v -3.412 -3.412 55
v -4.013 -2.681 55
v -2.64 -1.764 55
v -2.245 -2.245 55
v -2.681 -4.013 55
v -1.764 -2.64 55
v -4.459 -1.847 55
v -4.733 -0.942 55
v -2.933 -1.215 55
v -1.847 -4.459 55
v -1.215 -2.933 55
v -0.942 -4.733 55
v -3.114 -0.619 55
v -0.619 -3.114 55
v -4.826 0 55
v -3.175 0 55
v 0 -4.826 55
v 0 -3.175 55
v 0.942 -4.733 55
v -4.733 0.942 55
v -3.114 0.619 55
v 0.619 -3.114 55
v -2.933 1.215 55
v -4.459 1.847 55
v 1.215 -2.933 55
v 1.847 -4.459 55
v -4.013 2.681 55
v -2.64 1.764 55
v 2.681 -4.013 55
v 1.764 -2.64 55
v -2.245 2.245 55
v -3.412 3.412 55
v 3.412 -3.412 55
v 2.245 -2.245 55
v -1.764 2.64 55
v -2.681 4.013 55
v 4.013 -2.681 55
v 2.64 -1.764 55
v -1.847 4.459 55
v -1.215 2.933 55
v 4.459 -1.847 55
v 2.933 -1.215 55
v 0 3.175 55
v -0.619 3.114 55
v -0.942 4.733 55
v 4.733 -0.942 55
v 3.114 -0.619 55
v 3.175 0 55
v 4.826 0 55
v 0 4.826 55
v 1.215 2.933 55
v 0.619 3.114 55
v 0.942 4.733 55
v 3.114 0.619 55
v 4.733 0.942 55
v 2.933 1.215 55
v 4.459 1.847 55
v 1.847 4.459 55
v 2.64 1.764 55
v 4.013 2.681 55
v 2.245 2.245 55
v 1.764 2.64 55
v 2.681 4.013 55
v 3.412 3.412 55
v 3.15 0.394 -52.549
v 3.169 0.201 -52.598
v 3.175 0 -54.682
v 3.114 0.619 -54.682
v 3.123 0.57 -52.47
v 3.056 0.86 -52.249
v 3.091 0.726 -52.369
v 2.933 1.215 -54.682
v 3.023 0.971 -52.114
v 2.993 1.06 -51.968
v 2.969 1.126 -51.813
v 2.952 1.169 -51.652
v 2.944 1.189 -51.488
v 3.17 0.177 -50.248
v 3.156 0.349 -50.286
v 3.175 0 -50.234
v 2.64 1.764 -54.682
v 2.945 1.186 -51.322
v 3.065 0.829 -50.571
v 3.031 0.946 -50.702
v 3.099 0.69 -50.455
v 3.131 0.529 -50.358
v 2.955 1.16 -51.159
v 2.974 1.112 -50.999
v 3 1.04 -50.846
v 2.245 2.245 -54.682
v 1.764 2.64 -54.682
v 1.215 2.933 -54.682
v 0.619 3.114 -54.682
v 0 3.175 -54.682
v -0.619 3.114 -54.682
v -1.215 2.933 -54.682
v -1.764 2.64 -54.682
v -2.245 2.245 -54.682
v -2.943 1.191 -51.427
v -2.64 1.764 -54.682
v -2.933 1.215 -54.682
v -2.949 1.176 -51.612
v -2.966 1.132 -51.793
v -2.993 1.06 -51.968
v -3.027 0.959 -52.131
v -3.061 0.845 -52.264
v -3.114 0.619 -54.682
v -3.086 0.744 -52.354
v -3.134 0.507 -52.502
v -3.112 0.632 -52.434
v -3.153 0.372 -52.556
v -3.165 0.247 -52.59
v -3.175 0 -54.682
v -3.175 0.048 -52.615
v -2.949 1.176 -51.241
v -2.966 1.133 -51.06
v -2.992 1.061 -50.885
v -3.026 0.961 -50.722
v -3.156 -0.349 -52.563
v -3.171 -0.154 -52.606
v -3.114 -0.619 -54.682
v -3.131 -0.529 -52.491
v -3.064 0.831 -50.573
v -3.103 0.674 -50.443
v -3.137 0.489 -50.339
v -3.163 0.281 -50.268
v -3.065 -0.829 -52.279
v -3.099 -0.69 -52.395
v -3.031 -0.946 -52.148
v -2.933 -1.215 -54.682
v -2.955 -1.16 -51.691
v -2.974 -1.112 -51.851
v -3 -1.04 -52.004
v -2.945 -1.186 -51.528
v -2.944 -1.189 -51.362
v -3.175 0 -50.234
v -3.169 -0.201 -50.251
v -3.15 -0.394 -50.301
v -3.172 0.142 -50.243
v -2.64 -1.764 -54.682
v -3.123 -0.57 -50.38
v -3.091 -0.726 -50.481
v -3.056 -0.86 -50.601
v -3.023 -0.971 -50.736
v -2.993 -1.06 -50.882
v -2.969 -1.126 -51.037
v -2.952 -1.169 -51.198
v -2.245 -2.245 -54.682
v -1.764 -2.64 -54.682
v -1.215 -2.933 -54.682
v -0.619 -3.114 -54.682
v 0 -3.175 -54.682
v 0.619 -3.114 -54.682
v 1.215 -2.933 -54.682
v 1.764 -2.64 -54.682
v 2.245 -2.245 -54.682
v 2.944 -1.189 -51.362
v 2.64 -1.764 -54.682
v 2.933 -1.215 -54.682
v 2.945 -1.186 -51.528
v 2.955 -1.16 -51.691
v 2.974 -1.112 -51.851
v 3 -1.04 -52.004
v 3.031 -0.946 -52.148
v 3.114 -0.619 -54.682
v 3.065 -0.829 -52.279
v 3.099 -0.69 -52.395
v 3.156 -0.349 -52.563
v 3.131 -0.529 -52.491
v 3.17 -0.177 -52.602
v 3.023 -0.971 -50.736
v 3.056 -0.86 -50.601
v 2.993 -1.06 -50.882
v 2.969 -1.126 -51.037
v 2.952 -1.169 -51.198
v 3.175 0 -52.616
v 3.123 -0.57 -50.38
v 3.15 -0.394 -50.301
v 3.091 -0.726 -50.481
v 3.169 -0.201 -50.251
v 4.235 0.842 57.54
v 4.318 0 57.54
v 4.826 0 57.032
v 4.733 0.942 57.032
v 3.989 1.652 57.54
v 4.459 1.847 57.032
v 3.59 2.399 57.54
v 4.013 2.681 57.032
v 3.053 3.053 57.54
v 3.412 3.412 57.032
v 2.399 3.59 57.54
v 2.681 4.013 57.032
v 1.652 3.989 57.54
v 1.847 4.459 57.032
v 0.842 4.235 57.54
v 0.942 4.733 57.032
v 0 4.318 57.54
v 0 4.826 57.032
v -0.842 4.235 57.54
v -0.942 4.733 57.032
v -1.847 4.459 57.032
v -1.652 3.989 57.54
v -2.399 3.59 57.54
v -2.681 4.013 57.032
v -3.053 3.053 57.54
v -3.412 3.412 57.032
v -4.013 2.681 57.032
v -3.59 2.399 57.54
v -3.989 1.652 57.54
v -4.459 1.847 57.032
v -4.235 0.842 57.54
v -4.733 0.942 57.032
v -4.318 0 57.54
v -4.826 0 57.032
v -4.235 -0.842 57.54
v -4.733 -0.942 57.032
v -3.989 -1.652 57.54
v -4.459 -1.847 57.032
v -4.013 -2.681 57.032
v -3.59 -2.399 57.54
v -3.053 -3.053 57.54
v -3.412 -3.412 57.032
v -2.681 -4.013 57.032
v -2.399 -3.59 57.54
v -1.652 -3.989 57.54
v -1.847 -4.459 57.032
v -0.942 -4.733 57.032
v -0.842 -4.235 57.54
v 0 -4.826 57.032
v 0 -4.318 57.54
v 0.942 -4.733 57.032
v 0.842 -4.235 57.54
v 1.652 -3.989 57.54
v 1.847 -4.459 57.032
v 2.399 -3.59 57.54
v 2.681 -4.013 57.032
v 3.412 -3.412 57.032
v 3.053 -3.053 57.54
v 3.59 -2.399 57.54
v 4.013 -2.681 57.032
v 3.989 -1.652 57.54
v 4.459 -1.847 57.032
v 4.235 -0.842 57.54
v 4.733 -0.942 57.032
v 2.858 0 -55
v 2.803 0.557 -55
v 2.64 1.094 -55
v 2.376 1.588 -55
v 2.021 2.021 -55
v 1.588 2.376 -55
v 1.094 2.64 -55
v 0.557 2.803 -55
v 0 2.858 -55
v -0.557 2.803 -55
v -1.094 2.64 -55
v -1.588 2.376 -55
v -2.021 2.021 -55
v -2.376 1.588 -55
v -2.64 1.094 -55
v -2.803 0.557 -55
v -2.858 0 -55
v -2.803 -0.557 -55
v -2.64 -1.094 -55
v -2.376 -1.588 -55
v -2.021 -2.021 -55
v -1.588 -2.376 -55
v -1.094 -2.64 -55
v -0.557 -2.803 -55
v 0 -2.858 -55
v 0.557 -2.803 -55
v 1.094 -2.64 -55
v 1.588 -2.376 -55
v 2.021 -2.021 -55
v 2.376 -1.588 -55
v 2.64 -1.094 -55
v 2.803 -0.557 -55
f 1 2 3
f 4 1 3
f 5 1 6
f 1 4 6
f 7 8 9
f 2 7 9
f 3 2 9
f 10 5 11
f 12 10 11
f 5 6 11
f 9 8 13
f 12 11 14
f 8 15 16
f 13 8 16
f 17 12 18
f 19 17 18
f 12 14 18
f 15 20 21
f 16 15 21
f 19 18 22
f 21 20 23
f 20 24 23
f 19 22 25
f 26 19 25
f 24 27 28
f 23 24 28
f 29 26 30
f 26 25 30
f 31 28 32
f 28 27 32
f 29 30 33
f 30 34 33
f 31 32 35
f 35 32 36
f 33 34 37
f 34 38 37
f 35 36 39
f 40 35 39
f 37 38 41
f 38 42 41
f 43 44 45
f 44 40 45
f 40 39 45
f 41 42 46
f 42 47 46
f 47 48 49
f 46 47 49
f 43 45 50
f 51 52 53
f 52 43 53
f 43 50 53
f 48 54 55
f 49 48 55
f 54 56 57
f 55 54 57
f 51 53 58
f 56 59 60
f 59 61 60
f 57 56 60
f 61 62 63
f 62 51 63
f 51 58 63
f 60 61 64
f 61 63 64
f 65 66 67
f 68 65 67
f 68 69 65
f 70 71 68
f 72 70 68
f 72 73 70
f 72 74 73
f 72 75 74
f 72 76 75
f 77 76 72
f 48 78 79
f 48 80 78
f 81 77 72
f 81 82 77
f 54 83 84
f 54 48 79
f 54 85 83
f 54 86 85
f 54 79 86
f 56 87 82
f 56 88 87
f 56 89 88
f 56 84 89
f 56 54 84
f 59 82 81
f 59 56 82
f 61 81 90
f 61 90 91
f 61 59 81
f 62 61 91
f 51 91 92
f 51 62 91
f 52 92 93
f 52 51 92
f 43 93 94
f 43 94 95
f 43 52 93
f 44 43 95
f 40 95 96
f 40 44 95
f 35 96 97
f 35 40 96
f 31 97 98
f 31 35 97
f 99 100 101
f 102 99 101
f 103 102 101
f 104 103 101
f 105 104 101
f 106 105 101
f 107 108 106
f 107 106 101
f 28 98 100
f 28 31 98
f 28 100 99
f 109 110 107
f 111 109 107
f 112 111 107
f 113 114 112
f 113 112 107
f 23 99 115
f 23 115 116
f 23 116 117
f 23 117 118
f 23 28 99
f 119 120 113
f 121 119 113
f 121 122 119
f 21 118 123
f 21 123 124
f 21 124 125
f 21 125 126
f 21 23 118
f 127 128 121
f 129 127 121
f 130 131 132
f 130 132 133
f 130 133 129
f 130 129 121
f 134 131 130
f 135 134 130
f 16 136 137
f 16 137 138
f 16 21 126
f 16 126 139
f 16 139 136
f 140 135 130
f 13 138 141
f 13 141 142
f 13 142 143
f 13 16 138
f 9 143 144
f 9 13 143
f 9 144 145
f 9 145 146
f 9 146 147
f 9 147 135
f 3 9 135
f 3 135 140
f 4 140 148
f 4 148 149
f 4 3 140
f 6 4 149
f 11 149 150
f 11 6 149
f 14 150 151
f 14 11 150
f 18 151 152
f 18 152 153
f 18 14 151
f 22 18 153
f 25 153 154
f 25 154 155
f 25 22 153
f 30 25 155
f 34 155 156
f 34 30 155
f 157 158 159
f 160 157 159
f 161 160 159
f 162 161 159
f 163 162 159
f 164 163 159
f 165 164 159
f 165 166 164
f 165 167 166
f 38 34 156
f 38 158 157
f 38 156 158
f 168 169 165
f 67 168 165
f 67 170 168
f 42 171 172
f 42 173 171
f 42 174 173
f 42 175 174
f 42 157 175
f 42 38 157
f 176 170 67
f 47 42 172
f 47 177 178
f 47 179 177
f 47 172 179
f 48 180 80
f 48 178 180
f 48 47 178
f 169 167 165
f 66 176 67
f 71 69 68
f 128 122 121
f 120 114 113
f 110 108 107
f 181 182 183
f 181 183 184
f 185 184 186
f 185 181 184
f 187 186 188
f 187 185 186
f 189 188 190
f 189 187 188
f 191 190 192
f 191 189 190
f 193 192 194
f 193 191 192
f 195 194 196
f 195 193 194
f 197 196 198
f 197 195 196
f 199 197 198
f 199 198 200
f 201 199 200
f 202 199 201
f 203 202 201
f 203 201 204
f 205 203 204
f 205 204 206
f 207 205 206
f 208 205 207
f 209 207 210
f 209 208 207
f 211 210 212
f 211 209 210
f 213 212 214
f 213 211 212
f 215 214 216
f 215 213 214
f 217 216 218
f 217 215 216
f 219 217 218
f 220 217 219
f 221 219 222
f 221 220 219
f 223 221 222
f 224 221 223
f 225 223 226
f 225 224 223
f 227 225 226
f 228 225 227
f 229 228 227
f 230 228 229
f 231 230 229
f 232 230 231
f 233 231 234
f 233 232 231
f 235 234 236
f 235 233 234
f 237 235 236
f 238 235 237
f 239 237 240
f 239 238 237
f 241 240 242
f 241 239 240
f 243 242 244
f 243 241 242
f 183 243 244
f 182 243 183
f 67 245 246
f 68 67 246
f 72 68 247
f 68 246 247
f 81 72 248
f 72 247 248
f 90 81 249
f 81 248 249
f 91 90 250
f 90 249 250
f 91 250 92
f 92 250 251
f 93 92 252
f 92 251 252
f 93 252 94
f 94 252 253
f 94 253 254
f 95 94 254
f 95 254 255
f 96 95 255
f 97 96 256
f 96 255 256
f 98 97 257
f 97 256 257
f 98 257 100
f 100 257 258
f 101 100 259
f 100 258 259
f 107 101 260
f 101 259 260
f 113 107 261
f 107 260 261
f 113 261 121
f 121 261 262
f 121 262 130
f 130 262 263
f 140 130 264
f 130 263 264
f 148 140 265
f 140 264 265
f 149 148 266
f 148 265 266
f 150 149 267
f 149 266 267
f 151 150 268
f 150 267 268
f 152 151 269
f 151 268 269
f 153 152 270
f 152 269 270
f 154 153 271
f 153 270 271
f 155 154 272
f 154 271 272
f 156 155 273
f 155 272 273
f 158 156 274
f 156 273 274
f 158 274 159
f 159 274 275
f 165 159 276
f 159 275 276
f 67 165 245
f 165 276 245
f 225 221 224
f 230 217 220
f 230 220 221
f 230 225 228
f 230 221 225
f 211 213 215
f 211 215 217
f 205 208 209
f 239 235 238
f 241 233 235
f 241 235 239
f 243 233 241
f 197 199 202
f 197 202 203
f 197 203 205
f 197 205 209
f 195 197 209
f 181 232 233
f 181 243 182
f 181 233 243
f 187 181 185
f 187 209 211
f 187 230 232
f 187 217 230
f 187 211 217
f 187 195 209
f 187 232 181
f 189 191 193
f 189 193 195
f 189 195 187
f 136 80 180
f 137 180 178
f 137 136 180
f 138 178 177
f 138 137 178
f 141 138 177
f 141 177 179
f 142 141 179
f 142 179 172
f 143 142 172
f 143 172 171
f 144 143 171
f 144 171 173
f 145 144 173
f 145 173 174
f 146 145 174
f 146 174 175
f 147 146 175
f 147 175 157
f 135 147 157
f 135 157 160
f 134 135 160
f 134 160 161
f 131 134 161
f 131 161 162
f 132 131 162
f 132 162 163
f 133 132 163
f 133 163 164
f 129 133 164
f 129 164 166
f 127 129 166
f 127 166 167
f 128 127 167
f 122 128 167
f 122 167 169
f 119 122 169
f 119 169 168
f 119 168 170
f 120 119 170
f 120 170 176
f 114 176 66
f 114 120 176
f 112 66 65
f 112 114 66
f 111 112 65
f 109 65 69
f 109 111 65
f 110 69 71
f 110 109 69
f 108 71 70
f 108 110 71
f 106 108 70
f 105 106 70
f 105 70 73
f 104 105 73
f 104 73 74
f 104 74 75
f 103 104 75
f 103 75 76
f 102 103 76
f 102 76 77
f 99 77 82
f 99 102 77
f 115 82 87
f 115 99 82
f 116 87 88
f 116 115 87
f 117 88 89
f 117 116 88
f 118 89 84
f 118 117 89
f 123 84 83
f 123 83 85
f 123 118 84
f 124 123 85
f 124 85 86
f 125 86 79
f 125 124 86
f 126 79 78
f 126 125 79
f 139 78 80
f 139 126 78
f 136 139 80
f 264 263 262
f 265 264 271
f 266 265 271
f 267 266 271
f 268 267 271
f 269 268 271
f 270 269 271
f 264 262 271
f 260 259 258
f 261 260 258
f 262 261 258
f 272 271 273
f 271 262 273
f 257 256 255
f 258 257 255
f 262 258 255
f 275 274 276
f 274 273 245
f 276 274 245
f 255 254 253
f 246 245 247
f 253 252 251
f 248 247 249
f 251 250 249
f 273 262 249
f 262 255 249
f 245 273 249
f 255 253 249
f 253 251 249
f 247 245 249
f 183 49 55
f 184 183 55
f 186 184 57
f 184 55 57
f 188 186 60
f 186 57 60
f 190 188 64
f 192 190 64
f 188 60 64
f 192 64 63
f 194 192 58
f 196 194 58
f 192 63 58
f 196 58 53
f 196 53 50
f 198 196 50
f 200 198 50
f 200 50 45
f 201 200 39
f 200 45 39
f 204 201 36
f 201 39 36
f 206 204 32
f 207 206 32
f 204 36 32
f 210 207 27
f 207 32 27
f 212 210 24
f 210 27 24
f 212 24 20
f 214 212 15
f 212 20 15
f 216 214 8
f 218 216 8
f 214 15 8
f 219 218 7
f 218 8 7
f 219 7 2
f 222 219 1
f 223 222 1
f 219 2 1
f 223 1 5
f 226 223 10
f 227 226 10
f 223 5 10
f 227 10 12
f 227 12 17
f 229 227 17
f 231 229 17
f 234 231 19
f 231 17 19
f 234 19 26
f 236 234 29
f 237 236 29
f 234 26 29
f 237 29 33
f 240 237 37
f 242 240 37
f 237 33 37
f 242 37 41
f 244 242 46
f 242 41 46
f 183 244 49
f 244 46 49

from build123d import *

# Parameters (mm, degrees)
SKETCH1_R           = 3.175
EXTRUDE1_DEPTH      = 55
SKETCH2_R           = 4.826
EXTRUDE2_DEPTH      = 2.54
CHAMFER1_SIZE       = 0.508
EXTRUDE3_DEPTH      = 58.943352958
EXTRUDE3_DEPTH_BACK = 58.943352958
SKETCH3_R           = 1.190625
CHAMFER2_SIZE       = 0.3175


with BuildPart() as part:
    # Sketch1 → Extrude1 (new, symmetric)
    with BuildSketch(Plane.XY):
        Circle(SKETCH1_R)
    extrude(amount=EXTRUDE1_DEPTH, both=True)

    # Sketch2 → Extrude2 (add)
    with BuildSketch(Plane.XY.offset(55)):
        Circle(SKETCH2_R)
    extrude(amount=EXTRUDE2_DEPTH)

    # Chamfer1
    chamfer1_edges = [part.edges().sort_by_distance(p)[0] for p in [
        (-4.826, 0, 57.54),
    ]]
    chamfer(chamfer1_edges, length=CHAMFER1_SIZE)

    # Sketch3 → Extrude3 (cut, two sides: drawn at the far end of the back side and taken through both)
    with BuildSketch(Plane(origin=(0, 0, 0), x_dir=(0, 0, -1), z_dir=(1, 0, 0)).offset(-EXTRUDE3_DEPTH_BACK)):
        with Locations(Location((51.42495, 0, 0), (0, 0, 179.999999999))):
            Circle(SKETCH3_R)
    extrude(amount=EXTRUDE3_DEPTH + EXTRUDE3_DEPTH_BACK, mode=Mode.SUBTRACT)

    # Chamfer2
    chamfer2_edges = [part.edges().sort_by_distance(p)[0] for p in [
        (-3.175, 0, -55),
    ]]
    chamfer(chamfer2_edges, length=CHAMFER2_SIZE)


solid = part.part
